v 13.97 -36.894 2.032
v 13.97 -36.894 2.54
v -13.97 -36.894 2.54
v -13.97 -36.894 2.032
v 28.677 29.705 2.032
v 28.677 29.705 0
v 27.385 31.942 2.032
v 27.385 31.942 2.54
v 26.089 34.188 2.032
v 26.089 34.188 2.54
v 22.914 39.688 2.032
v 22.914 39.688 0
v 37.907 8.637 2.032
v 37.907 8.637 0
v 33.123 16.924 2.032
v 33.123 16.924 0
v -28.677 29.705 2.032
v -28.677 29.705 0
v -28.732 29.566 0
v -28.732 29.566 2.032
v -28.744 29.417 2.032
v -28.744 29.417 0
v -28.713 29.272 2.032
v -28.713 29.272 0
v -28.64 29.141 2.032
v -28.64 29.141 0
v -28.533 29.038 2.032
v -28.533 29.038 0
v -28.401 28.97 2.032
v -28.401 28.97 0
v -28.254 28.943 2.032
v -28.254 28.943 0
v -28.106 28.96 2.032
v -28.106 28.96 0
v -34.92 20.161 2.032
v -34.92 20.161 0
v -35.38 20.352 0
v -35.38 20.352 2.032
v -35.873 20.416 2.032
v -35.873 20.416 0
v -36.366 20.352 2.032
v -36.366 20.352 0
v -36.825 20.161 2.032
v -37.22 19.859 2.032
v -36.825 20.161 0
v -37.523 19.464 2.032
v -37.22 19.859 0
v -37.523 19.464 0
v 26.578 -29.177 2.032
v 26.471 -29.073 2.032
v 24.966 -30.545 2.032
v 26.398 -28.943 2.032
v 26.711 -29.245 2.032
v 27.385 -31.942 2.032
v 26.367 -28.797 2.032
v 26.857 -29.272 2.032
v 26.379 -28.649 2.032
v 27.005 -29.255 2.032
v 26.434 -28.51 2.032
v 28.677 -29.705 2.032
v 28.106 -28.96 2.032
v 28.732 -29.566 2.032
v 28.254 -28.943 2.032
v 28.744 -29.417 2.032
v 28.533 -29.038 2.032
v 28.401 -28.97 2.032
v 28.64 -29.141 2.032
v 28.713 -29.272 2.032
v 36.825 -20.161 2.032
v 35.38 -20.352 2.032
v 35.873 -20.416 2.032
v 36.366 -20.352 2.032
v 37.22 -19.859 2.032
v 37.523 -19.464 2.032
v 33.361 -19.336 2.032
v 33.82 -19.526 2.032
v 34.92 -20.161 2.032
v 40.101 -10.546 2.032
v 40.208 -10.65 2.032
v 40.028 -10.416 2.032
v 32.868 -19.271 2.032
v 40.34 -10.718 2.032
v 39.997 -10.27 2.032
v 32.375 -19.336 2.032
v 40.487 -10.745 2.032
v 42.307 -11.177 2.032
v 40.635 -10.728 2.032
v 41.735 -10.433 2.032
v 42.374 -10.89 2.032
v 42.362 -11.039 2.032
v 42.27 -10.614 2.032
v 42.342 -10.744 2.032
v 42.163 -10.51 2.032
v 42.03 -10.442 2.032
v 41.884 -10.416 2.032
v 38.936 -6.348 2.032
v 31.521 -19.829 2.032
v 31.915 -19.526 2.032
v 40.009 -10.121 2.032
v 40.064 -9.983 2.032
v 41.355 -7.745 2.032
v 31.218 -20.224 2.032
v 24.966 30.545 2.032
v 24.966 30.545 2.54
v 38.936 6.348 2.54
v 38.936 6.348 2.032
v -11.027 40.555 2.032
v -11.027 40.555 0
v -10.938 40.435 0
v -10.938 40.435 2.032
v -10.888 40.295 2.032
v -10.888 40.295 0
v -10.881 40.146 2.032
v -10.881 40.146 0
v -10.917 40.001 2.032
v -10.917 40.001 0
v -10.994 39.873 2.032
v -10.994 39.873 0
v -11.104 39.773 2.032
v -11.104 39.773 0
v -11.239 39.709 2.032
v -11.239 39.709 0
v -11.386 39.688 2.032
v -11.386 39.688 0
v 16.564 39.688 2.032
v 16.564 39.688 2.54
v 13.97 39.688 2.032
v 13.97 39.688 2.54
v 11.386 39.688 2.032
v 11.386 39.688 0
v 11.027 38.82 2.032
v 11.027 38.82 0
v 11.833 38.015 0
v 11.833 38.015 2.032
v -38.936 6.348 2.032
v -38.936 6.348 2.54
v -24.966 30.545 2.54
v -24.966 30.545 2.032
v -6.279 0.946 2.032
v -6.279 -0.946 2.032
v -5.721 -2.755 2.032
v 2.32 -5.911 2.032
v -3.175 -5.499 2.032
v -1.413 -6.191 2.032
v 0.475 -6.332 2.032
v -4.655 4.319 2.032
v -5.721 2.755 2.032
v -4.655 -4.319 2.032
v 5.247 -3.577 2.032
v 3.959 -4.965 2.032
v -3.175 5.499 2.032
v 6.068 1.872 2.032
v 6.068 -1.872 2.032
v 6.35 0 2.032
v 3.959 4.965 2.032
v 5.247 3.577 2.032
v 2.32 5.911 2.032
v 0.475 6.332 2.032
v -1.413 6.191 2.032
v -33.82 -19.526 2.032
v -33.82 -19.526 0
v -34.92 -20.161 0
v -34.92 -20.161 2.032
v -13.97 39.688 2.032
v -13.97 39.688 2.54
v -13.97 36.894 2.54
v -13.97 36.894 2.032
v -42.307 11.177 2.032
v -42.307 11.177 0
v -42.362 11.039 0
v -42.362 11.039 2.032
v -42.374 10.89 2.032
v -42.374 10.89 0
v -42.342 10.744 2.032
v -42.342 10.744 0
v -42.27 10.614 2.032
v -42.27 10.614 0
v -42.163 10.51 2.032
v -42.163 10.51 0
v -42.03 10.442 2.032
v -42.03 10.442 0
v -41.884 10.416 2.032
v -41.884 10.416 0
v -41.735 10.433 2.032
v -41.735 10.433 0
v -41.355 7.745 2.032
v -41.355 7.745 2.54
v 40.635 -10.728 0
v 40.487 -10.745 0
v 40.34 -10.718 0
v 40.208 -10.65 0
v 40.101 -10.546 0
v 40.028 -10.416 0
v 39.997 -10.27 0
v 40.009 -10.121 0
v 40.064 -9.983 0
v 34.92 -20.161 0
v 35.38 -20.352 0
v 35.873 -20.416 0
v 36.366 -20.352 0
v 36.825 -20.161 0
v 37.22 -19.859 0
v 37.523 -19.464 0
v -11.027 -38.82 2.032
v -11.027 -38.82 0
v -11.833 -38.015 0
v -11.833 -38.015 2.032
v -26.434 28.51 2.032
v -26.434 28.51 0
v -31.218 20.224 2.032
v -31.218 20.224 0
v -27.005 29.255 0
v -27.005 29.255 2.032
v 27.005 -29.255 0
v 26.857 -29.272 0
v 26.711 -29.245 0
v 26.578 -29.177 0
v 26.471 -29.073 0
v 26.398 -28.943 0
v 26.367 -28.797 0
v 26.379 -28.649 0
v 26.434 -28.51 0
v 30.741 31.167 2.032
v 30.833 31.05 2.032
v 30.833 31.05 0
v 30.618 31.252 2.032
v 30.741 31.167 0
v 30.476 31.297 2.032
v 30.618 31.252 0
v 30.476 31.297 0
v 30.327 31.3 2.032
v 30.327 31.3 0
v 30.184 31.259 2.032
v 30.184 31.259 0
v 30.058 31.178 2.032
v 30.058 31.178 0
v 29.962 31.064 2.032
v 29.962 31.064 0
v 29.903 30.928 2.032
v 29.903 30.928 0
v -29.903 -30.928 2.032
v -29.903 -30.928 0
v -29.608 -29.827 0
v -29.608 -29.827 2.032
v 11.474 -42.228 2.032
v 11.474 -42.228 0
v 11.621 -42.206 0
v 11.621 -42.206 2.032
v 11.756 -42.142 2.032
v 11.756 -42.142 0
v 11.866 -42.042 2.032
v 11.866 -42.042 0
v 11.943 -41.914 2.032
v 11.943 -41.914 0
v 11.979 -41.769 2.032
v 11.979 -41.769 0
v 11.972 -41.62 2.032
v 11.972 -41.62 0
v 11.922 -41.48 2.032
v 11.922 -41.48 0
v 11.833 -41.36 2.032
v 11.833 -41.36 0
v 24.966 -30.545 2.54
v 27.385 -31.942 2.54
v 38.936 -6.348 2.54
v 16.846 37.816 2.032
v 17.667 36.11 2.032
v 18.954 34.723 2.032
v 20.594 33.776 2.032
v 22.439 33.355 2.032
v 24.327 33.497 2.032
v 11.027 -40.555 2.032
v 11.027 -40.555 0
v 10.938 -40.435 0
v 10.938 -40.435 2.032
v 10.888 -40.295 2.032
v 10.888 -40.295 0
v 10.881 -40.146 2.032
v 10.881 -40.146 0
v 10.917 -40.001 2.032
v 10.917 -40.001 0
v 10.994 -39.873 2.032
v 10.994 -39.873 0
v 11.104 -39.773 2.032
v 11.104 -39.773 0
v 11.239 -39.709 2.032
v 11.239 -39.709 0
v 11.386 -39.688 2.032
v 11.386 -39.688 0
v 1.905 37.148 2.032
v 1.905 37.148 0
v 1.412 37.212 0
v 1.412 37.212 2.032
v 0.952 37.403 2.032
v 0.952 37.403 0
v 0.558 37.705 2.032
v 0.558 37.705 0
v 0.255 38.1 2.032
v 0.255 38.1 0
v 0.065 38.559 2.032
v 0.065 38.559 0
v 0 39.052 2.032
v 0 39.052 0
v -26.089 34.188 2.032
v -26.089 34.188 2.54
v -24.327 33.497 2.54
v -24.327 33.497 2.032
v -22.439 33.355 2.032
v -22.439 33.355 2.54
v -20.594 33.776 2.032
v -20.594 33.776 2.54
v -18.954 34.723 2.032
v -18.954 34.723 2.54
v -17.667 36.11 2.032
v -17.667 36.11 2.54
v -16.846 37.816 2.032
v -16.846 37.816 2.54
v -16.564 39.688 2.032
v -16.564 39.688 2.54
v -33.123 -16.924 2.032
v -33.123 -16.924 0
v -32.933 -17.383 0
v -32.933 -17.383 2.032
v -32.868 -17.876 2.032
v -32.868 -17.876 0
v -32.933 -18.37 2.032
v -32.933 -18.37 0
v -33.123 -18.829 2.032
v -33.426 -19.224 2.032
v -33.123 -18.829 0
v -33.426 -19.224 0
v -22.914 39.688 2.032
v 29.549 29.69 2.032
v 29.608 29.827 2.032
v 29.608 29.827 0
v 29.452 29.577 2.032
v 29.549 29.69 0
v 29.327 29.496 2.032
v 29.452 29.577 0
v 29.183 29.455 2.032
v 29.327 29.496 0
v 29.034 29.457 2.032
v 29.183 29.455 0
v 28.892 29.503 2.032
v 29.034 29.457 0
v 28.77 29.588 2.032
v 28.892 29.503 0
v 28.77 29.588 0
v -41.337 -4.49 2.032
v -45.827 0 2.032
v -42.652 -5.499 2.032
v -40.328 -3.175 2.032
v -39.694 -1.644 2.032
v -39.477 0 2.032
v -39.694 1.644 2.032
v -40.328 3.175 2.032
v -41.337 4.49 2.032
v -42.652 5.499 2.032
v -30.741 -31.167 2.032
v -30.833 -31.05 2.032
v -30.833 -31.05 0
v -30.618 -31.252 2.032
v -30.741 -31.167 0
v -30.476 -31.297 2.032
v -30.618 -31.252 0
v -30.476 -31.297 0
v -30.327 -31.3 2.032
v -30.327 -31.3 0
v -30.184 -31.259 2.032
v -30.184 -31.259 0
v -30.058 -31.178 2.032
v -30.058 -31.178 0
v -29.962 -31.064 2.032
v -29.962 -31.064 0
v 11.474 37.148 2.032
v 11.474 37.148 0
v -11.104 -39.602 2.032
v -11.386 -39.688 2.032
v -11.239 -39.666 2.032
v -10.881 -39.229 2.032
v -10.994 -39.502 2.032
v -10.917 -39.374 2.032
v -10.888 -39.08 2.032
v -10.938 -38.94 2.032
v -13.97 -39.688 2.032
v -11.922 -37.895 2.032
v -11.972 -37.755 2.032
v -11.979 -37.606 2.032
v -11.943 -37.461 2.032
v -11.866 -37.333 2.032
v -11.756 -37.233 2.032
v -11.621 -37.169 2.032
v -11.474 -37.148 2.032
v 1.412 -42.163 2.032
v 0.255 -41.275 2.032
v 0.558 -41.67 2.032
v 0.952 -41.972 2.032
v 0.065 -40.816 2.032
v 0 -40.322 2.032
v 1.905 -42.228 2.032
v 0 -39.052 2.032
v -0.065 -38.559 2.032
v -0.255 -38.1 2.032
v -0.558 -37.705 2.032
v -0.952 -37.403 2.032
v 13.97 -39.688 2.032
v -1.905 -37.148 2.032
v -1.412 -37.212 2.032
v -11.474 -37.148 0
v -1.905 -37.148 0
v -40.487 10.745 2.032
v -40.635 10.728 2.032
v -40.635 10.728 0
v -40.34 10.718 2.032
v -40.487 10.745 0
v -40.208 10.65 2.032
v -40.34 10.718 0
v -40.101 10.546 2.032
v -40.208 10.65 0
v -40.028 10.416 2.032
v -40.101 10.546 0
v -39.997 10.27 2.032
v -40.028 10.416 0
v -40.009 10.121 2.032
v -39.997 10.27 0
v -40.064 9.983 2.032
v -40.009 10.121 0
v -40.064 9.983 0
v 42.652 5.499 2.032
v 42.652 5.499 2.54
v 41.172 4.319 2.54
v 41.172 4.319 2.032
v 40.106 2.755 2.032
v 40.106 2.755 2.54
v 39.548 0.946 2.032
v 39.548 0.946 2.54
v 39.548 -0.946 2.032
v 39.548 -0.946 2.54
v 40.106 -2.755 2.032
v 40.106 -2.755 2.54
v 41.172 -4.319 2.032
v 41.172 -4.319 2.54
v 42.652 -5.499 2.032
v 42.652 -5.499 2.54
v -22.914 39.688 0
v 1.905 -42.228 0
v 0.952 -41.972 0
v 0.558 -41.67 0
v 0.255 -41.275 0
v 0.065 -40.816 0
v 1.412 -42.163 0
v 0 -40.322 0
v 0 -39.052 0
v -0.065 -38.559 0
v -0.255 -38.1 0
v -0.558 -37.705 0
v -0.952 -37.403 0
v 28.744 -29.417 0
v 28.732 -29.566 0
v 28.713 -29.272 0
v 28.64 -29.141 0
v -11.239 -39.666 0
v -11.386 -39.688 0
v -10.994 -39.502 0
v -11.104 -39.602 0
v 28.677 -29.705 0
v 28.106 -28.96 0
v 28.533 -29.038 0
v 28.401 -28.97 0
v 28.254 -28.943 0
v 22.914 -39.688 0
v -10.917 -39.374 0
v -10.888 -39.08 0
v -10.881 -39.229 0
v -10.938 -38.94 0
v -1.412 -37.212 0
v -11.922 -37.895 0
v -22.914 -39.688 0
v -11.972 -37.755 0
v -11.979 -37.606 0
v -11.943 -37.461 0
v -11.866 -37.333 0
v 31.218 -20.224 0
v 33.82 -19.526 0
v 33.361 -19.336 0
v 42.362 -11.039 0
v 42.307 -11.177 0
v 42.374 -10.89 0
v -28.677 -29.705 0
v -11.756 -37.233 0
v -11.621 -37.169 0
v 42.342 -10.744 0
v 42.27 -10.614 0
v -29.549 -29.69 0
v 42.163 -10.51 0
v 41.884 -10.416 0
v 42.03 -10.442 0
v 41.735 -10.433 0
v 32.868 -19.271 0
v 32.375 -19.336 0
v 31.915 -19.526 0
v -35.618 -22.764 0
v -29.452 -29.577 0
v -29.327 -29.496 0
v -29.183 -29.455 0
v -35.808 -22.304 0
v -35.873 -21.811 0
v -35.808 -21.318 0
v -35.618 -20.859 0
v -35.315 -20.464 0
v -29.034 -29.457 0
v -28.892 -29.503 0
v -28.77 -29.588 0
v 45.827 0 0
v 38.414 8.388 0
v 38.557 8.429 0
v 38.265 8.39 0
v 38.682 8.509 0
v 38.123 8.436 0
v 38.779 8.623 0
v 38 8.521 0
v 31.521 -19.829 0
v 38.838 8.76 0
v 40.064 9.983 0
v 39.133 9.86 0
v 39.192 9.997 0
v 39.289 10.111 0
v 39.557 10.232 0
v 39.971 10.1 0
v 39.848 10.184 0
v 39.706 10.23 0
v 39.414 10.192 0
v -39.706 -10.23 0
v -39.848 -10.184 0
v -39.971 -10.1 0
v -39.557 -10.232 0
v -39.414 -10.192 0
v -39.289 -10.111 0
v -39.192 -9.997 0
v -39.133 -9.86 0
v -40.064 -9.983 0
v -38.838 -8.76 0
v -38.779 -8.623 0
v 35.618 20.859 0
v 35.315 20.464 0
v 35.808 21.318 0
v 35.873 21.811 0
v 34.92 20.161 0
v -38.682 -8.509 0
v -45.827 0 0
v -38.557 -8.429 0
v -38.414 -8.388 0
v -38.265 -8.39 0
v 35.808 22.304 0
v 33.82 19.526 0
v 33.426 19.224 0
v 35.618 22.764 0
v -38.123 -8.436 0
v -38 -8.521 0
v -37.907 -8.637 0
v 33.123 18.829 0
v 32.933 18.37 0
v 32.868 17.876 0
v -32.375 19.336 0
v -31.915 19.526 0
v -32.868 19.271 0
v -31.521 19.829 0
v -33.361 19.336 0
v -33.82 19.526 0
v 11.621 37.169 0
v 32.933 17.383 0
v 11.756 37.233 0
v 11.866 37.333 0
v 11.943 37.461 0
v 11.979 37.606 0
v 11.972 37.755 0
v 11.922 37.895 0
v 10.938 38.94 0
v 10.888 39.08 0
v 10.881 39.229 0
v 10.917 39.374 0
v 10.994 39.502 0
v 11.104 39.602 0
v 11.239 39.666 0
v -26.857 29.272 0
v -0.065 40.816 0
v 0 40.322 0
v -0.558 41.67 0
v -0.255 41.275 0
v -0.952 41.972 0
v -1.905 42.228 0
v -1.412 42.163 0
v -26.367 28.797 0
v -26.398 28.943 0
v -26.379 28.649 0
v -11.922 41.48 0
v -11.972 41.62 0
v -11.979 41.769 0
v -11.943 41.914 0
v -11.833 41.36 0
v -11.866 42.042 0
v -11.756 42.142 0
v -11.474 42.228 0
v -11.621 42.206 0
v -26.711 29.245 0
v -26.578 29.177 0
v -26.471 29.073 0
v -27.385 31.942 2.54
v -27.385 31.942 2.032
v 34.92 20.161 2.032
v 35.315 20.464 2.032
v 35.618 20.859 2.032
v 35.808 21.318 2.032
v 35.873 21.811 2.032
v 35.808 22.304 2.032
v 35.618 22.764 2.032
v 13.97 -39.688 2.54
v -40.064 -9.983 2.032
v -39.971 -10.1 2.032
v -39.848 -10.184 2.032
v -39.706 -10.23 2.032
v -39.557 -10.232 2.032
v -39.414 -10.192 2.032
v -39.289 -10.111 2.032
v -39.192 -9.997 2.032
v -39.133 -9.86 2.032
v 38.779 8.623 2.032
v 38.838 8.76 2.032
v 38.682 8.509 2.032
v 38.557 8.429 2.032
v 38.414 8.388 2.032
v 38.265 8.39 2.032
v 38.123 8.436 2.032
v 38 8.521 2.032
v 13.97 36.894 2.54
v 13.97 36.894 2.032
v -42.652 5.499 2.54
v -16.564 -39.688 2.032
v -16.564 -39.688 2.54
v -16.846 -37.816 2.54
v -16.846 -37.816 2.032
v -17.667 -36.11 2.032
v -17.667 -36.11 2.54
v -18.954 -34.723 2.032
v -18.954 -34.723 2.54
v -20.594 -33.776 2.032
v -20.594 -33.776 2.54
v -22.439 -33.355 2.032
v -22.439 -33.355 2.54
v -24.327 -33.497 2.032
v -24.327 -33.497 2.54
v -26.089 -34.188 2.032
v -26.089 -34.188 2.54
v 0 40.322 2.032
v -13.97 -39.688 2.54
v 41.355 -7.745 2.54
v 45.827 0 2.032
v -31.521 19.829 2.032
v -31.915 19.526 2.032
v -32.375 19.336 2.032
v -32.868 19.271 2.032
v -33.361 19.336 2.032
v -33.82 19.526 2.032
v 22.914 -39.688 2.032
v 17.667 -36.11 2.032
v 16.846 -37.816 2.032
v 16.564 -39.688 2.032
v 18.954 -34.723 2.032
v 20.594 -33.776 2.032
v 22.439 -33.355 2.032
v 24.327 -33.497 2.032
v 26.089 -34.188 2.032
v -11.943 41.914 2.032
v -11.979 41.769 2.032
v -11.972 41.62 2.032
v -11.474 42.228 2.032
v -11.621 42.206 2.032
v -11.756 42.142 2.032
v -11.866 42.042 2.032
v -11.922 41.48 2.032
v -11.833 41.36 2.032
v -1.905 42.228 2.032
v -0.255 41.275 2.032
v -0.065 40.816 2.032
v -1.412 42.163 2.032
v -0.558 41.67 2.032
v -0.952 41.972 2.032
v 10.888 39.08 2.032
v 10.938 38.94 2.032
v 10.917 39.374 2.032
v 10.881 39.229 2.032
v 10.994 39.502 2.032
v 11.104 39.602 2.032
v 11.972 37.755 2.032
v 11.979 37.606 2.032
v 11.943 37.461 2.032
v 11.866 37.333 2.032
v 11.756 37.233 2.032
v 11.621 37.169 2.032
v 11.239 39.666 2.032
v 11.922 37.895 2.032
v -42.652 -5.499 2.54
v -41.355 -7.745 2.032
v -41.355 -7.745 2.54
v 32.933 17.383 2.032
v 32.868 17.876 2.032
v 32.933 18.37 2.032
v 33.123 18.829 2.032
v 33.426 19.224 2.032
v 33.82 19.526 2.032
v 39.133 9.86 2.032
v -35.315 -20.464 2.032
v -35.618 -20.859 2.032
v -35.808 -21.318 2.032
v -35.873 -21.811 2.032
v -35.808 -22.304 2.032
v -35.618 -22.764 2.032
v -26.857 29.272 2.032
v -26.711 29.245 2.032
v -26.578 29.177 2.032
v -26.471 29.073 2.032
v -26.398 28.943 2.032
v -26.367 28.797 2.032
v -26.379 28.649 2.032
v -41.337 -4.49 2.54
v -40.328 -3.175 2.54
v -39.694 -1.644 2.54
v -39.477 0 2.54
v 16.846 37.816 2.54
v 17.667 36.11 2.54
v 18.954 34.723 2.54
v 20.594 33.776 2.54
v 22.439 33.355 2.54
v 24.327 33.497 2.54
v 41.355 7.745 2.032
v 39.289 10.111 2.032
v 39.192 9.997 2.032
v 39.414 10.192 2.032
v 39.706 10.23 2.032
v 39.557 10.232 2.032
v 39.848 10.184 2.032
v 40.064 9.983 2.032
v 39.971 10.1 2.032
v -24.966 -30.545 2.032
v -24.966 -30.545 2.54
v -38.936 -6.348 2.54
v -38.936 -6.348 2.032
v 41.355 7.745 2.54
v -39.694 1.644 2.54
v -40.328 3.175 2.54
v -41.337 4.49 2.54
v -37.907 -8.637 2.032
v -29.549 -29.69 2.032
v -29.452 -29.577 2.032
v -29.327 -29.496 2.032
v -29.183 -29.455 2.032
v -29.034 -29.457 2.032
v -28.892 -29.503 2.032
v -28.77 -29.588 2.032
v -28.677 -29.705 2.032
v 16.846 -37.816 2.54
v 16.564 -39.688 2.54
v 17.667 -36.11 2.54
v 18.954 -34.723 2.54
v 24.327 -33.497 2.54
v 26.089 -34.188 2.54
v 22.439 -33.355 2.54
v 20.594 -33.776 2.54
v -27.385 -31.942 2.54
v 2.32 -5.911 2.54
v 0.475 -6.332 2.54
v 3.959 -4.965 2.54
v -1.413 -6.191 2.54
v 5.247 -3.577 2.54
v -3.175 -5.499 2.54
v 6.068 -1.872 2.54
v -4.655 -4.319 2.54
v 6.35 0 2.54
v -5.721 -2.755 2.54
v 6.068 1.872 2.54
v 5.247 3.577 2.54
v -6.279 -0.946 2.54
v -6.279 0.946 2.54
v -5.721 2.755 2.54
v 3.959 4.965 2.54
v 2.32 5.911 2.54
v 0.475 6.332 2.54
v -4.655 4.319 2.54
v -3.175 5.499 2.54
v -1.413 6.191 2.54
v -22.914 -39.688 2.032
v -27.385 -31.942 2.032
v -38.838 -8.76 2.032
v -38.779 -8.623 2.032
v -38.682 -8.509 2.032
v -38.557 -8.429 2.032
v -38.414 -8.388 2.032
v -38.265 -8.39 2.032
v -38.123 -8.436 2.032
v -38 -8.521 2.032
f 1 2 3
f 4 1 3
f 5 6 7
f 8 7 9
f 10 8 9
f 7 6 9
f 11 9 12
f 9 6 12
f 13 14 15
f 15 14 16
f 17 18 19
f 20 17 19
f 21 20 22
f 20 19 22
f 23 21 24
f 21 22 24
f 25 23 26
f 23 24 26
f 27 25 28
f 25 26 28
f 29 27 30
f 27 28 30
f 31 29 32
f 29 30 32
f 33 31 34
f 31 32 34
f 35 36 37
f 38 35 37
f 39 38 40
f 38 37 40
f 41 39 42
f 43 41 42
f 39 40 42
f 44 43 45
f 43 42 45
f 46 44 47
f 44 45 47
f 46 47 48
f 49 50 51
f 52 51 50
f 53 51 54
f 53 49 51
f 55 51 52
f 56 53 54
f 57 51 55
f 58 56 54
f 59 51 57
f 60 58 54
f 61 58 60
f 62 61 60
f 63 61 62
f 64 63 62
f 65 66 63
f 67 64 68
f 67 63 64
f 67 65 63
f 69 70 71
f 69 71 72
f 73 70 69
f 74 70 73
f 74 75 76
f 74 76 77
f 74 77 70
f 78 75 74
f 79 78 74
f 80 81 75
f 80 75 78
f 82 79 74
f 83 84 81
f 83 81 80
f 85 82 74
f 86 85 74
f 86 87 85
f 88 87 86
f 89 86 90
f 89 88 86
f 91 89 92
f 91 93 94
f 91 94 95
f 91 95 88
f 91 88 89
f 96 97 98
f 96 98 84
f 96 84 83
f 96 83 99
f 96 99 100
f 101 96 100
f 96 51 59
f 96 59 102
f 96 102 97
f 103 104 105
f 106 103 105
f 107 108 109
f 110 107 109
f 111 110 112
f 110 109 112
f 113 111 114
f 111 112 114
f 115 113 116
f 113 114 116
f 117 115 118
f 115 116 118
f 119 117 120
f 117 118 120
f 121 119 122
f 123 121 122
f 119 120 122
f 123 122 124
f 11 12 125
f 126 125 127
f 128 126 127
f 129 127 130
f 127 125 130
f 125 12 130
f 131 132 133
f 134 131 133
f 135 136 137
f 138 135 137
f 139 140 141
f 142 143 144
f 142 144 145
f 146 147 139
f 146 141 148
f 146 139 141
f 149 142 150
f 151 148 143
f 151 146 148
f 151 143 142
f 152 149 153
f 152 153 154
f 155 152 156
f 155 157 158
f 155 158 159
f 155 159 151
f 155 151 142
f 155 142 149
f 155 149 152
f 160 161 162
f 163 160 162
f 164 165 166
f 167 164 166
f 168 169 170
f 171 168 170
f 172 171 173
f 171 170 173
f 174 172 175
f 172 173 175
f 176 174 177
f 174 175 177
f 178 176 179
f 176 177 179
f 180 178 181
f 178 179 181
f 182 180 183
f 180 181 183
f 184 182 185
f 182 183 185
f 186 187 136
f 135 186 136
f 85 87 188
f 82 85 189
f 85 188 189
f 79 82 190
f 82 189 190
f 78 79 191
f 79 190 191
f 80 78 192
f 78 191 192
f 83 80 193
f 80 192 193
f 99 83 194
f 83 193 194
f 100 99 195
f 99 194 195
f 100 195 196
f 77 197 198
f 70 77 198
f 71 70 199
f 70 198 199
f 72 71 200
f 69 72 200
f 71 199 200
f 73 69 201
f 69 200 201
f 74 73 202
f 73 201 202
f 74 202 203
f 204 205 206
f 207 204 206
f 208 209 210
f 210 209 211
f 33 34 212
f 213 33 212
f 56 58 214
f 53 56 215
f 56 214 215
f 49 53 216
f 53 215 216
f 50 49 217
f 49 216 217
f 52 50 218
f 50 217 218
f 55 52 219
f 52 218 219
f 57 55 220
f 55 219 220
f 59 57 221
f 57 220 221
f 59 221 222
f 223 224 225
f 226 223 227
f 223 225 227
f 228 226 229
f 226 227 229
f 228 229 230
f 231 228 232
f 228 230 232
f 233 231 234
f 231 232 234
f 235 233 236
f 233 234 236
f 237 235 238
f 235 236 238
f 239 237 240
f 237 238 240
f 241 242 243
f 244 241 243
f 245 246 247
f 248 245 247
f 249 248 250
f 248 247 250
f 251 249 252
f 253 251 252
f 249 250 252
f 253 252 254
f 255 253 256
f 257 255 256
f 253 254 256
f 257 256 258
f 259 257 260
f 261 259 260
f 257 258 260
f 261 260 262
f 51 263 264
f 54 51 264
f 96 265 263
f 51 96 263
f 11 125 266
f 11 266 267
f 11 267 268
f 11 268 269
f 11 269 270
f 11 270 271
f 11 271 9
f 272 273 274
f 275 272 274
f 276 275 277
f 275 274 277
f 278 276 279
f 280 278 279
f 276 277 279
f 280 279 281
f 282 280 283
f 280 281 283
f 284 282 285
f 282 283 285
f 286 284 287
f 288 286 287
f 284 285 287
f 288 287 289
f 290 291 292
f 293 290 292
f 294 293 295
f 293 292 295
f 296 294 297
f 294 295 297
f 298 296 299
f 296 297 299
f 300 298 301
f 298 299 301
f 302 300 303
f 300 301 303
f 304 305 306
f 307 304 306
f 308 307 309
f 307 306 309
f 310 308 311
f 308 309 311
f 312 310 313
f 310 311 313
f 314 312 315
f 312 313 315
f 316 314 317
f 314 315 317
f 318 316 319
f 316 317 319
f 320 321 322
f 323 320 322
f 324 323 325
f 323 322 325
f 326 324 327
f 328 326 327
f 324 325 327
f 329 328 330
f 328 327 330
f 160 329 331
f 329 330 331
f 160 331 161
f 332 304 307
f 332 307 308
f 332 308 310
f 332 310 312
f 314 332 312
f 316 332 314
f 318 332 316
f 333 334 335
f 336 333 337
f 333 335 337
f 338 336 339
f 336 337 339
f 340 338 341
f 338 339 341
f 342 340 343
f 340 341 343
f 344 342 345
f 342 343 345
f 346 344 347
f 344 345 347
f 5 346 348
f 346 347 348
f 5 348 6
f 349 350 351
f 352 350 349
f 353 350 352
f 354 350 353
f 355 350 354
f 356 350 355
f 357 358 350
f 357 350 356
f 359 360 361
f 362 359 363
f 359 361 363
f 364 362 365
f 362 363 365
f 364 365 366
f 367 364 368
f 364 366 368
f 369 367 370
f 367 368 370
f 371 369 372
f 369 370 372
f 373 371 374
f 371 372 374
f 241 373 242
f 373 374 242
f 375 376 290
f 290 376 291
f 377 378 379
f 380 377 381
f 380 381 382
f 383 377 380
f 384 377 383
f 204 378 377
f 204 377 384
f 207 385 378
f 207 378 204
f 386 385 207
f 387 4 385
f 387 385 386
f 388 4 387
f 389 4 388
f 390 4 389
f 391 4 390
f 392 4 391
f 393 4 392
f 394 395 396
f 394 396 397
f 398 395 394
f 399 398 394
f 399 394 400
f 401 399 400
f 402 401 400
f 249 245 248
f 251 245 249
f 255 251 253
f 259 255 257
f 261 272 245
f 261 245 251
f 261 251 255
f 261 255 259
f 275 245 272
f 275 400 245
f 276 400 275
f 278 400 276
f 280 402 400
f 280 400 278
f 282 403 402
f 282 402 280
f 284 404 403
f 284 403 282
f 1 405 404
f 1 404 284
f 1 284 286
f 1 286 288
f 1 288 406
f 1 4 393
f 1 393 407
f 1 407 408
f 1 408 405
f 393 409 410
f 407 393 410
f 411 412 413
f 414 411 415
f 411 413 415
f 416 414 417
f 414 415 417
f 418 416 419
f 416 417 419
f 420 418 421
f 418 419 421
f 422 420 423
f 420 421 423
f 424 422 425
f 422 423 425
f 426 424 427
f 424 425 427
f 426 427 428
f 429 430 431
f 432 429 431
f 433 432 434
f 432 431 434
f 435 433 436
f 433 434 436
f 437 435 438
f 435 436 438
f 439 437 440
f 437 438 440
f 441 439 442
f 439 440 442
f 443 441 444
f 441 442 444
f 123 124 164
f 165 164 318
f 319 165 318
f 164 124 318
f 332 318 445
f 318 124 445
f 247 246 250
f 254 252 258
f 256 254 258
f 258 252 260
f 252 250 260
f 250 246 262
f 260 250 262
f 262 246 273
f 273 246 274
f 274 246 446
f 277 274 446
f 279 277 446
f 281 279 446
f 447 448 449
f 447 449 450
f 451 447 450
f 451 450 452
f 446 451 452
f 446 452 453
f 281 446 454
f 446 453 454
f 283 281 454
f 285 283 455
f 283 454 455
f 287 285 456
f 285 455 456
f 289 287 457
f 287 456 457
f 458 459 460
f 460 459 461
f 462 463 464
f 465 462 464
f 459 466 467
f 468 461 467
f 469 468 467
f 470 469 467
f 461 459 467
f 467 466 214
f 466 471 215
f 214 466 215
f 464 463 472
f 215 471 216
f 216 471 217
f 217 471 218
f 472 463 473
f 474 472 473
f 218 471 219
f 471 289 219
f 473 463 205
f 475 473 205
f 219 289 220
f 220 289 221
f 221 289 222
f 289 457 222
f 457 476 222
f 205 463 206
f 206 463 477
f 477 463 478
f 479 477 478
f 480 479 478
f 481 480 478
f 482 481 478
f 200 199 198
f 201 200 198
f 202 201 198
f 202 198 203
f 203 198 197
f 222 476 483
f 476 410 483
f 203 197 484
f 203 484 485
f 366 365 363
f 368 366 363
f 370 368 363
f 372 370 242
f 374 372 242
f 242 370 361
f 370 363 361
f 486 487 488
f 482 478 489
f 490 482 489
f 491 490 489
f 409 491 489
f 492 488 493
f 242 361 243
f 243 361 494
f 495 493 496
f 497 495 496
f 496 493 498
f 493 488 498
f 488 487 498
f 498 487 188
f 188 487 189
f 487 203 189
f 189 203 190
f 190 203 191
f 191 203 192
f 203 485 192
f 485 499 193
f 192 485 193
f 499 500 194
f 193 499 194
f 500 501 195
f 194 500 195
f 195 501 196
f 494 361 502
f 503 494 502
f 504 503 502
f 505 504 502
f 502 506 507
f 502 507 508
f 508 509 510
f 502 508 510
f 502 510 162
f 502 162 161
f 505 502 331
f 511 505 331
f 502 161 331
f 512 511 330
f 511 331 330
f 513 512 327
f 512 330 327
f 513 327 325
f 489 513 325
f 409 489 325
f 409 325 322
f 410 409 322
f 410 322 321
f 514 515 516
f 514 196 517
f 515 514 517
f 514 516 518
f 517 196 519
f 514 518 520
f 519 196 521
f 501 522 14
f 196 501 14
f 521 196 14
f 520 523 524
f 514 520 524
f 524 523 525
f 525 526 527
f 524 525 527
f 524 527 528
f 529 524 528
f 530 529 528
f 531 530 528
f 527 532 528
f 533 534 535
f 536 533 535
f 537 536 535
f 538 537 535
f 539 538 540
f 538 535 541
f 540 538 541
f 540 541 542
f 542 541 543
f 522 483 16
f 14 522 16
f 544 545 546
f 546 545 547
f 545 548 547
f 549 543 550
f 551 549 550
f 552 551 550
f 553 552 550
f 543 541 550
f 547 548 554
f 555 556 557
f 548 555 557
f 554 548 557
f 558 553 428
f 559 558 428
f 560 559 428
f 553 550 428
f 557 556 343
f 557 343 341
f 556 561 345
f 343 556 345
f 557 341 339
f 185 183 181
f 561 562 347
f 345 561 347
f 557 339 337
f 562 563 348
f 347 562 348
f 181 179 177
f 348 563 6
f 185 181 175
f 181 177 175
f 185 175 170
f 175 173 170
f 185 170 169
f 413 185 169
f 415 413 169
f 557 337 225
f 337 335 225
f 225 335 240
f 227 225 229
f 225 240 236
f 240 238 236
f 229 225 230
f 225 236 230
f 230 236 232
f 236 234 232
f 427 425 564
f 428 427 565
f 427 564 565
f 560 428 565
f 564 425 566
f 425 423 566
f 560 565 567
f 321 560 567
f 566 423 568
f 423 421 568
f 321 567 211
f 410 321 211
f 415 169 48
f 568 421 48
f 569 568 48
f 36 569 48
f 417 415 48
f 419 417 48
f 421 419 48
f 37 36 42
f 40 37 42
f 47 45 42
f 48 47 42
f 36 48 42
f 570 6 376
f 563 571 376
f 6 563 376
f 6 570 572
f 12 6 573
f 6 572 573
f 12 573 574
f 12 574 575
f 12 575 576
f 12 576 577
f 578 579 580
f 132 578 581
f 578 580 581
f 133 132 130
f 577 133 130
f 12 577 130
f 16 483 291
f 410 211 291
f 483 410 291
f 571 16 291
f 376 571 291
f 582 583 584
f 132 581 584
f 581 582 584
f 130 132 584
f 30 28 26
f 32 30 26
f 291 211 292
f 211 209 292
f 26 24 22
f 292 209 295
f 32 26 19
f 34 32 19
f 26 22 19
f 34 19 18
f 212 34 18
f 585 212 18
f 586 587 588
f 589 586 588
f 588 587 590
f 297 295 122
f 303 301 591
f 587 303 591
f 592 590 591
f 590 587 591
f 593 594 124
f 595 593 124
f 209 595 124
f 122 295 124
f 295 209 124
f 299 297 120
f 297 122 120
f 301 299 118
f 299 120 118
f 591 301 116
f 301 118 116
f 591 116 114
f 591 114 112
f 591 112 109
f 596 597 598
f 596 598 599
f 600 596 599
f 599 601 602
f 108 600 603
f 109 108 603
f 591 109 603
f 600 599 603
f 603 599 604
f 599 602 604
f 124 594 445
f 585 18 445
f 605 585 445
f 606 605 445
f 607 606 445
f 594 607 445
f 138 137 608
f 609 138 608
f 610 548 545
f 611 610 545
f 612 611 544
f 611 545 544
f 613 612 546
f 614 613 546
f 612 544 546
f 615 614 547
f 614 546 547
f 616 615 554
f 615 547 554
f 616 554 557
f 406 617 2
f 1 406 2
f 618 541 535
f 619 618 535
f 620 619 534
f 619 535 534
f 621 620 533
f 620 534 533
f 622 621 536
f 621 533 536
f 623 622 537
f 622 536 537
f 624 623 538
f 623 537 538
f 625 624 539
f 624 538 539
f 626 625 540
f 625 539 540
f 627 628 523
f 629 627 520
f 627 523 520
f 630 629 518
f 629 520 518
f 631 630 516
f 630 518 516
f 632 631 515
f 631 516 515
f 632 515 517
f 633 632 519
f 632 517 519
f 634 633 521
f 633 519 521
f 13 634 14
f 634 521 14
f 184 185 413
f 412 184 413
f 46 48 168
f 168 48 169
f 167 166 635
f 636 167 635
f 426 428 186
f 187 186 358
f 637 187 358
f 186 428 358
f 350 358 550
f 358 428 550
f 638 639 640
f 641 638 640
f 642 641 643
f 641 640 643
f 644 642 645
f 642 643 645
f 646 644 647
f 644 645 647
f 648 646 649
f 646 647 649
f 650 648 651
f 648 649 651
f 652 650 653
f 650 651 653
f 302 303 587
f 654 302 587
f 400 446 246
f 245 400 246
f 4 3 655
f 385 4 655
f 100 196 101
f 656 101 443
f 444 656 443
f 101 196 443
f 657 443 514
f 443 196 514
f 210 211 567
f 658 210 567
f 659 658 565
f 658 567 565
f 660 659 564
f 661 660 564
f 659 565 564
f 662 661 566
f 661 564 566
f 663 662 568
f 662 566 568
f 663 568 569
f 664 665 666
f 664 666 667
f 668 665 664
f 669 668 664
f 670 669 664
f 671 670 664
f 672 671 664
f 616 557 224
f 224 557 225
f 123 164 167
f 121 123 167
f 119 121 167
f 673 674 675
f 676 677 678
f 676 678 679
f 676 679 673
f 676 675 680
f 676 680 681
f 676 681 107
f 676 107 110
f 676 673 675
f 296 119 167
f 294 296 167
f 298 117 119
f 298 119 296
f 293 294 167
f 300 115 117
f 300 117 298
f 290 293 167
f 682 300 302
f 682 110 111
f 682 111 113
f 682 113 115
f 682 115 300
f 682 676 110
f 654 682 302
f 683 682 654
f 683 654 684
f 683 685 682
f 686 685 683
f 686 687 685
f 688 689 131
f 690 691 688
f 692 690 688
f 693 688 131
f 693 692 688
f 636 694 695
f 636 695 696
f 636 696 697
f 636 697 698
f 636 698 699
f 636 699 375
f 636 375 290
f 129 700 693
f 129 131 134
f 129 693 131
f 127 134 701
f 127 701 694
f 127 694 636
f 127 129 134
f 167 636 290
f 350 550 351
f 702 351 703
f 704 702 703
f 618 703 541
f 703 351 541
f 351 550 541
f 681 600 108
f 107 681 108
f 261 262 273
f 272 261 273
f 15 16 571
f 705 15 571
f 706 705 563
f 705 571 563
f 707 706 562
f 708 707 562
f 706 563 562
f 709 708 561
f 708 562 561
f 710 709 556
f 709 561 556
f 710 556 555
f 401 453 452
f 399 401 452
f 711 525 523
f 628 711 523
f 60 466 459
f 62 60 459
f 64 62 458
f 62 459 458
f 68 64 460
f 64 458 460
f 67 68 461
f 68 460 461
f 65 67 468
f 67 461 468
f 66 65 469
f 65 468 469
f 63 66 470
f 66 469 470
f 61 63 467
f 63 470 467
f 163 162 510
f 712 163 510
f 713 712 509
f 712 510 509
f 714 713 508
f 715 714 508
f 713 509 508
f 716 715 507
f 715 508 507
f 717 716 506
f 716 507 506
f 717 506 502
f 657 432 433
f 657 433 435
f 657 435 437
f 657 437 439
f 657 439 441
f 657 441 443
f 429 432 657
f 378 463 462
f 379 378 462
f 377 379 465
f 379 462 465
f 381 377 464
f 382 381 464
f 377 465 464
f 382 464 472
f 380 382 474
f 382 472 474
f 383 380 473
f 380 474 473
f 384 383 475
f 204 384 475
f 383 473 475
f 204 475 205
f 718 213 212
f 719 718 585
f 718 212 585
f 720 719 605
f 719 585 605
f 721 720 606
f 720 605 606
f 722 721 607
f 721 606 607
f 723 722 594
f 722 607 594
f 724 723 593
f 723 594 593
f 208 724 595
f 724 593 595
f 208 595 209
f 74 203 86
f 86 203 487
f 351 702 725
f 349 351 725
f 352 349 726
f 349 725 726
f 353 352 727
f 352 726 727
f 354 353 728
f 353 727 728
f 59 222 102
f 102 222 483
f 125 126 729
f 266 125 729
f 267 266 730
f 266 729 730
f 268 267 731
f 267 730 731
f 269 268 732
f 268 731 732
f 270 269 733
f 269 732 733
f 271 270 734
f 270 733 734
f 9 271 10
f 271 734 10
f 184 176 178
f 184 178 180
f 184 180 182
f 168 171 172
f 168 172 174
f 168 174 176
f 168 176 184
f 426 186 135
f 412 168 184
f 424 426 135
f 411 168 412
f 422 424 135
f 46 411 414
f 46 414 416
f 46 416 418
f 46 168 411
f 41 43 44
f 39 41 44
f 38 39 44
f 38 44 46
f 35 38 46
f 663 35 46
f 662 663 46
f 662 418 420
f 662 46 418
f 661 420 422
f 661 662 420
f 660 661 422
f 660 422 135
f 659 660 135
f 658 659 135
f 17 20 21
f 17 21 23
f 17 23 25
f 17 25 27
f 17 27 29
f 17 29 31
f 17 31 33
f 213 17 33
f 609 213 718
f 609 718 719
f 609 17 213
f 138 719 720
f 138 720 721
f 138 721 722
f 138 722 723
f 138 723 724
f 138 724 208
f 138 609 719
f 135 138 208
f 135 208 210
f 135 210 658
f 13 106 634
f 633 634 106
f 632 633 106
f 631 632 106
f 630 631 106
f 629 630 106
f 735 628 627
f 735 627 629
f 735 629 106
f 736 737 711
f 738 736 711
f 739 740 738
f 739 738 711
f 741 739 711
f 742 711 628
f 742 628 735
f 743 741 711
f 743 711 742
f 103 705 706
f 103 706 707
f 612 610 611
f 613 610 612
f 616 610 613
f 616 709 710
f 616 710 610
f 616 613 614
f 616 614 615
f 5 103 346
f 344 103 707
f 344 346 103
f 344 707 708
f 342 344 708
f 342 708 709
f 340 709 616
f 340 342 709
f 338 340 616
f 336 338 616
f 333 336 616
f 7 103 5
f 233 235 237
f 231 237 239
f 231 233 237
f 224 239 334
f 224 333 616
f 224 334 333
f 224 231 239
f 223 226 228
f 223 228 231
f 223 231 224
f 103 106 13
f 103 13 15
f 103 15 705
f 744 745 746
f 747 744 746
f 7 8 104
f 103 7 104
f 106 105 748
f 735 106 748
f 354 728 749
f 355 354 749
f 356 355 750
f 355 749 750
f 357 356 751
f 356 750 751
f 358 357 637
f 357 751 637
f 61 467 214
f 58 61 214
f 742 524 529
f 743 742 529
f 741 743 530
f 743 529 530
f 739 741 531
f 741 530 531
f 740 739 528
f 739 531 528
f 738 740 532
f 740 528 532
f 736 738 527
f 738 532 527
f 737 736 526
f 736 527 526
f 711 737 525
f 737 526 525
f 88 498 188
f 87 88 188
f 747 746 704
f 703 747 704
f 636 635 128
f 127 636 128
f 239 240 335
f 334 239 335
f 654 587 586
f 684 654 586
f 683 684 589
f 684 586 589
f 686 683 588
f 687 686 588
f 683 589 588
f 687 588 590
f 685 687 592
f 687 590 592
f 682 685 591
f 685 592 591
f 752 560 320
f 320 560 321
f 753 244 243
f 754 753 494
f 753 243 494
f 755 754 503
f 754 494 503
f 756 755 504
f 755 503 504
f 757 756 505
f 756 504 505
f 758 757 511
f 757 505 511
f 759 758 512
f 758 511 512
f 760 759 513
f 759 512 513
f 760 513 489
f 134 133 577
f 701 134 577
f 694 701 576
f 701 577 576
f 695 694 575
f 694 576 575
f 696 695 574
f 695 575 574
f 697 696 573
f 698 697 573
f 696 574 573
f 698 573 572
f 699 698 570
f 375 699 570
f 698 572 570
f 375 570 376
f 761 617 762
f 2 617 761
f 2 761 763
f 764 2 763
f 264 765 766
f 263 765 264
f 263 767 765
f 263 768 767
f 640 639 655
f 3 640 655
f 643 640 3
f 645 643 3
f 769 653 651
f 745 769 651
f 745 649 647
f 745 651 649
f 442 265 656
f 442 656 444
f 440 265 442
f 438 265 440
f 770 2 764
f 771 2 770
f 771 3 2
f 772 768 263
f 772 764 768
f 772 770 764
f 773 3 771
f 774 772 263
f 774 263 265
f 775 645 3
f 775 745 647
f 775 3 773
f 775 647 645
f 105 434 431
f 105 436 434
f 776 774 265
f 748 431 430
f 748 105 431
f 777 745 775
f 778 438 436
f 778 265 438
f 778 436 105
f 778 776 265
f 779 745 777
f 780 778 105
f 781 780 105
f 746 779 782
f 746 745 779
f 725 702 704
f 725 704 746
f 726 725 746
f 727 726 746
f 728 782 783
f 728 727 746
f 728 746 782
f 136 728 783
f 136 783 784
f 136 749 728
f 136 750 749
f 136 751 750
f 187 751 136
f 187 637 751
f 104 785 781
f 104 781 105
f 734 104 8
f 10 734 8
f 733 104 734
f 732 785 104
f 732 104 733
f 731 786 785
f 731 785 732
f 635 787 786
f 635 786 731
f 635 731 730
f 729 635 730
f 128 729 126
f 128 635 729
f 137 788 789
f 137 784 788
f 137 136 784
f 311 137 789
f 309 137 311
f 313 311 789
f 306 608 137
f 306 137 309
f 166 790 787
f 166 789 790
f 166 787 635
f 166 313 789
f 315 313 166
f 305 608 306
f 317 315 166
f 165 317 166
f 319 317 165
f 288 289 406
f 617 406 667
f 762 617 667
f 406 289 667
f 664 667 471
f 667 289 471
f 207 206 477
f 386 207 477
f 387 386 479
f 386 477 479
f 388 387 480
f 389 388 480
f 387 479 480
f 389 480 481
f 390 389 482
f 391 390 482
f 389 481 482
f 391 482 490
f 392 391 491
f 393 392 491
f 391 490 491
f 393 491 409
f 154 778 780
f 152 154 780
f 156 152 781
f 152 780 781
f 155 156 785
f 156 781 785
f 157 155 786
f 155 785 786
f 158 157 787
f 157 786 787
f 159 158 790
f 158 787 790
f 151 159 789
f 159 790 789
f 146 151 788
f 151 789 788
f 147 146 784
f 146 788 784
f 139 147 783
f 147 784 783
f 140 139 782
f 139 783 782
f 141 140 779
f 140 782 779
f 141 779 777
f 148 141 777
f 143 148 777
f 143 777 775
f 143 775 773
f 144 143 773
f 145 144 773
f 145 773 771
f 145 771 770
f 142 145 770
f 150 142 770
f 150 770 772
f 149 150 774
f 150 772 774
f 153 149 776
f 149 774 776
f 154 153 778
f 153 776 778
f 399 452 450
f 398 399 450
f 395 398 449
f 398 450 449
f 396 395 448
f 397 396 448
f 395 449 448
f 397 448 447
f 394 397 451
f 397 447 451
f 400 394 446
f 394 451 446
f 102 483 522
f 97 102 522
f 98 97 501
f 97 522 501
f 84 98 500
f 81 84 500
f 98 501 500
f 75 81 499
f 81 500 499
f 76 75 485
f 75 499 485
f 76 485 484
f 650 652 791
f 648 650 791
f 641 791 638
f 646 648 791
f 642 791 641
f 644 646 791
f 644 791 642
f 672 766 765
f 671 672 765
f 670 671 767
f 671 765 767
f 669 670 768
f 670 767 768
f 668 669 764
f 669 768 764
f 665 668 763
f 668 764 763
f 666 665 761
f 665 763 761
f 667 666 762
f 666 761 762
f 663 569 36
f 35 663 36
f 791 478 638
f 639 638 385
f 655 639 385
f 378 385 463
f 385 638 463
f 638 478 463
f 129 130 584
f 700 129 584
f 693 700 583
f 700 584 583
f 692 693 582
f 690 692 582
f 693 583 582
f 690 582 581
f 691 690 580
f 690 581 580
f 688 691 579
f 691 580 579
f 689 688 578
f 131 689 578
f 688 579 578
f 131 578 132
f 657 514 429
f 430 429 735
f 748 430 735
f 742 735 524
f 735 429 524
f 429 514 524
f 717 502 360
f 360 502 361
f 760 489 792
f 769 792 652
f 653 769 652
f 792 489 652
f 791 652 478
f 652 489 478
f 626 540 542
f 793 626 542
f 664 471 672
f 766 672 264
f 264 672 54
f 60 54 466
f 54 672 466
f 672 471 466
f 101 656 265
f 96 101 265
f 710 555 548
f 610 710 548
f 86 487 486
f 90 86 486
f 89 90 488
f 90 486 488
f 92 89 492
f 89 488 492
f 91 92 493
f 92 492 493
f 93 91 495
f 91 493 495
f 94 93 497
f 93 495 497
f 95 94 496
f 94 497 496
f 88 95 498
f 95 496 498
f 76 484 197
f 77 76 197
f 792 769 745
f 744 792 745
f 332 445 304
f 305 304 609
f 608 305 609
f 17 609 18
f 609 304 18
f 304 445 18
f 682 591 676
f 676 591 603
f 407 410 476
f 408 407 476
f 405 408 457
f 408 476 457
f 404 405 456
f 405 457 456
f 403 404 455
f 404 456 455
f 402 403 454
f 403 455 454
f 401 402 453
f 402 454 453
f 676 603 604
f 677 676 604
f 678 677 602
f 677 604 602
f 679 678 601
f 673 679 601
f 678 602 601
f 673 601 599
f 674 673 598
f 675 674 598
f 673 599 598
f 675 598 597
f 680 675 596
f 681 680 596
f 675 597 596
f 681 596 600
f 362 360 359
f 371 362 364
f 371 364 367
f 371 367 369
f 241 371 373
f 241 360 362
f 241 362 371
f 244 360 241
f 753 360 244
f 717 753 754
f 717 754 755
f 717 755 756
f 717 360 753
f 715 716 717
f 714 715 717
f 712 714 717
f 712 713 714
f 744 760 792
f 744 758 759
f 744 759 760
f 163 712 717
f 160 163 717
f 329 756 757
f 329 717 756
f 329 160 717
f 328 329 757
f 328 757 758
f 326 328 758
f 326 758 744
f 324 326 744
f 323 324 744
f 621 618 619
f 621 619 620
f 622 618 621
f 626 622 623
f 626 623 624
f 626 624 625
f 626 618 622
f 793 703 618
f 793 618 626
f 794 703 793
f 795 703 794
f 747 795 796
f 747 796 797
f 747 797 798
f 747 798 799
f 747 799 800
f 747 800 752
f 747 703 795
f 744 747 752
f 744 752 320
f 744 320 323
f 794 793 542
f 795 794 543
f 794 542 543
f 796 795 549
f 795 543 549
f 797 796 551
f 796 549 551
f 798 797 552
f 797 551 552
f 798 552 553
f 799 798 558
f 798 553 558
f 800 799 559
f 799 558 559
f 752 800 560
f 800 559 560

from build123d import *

# Parameters (mm, degrees)
F1_DEPTH = 2.54
F2_COUNT = 6
F4_R     = 6.35
F5_DEPTH = 0.508


# Not quite as in the source:
# - a feature names something its author has since deleted; it is built from what else it names


with BuildPart() as f1:
    # F0 (on Top) → F1 (new body)
    with BuildSketch(Plane.XY):
        with BuildLine():
            Line((11.3864204897, -39.6875), (22.9135888085, -39.6875))
            Line((22.9135888085, -39.6875), (0, 0))
            Line((0, 0), (-22.9135888085, -39.6875))
            Line((-22.9135888085, -39.6875), (-11.3864204897, -39.6875))
            ThreePointArc((-11.3864204897, -39.6875), (-10.9170896872, -39.3739031836), (-11.0272102448, -38.8202897552))
            Line((-11.0272102448, -38.8202897552), (-11.8327897552, -38.0147102448))
            ThreePointArc((-11.8327897552, -38.0147102448), (-11.9429103128, -37.4610968164), (-11.4735795103, -37.1475))
            Line((-11.4735795103, -37.1475), (-1.905, -37.1475))
            ThreePointArc((-1.905, -37.1475), (-0.5579615818, -37.7054615818), (0, -39.0525))
            Line((0, -39.0525), (0, -39.6875))
            Line((0, -39.6875), (11.3864204897, -39.6875))
        make_face()
        with BuildLine():
            ThreePointArc((11.0272102448, -40.5547102448), (10.9170896872, -40.0010968164), (11.3864204897, -39.6875))
            Line((11.3864204897, -39.6875), (0, -39.6875))
            Line((0, -39.6875), (0, -40.3225))
            ThreePointArc((0, -40.3225), (0.5579615818, -41.6695384182), (1.905, -42.2275))
            Line((1.905, -42.2275), (11.4735795103, -42.2275))
            ThreePointArc((11.4735795103, -42.2275), (11.9429103128, -41.9139031836), (11.8327897552, -41.3602897552))
            Line((11.8327897552, -41.3602897552), (11.0272102448, -40.5547102448))
        make_face()
    extrude(amount=F1_DEPTH)


with BuildPart() as f2_1:
    # F2: instance of F1
    add(f1.part.rotate(Axis((0, 0, 1.27), (0, 0, -1)), 1 * 360 / F2_COUNT))


with BuildPart() as f2_2:
    # F2: instance of F1
    add(f1.part.rotate(Axis((0, 0, 1.27), (0, 0, -1)), 2 * 360 / F2_COUNT))


with BuildPart() as f2_3:
    # F2: instance of F1
    add(f1.part.rotate(Axis((0, 0, 1.27), (0, 0, -1)), 3 * 360 / F2_COUNT))


with BuildPart() as f2_4:
    # F2: instance of F1
    add(f1.part.rotate(Axis((0, 0, 1.27), (0, 0, -1)), 4 * 360 / F2_COUNT))


with BuildPart() as f2_5:
    # F2: instance of F1
    add(f1.part.rotate(Axis((0, 0, 1.27), (0, 0, -1)), 5 * 360 / F2_COUNT))


with BuildPart() as f1_1:
    add(f1.part)

    # F3: union F2_1, F2_2, F2_3, F2_4, F2_5
    add(f2_1.part)
    add(f2_2.part)
    add(f2_3.part)
    add(f2_4.part)
    add(f2_5.part)

    # F4 (on face) → F5 (cut)
    with BuildSketch(Plane.XY.offset(2.54)):
        with BuildLine():
            Line((13.97, -36.8935), (-13.97, -36.8935))
            Line((-13.97, -36.8935), (-13.97, -39.6875))
            Line((-13.97, -39.6875), (-11.3864204897, -39.6875))
            ThreePointArc((-11.3864204897, -39.6875), (-10.9170896872, -39.3739031836), (-11.0272102448, -38.8202897552))
            Line((-11.0272102448, -38.8202897552), (-11.8327897552, -38.0147102448))
            ThreePointArc((-11.8327897552, -38.0147102448), (-11.9429103128, -37.4610968164), (-11.4735795103, -37.1475))
            Line((-11.4735795103, -37.1475), (-1.905, -37.1475))
            ThreePointArc((-1.905, -37.1475), (-0.5579615818, -37.7054615818), (0, -39.0525))
            Line((0, -39.0525), (0, -40.3225))
            ThreePointArc((0, -40.3225), (0.5579615818, -41.6695384182), (1.905, -42.2275))
            Line((1.905, -42.2275), (11.4735795103, -42.2275))
            ThreePointArc((11.4735795103, -42.2275), (11.9429103128, -41.9139031836), (11.8327897552, -41.3602897552))
            Line((11.8327897552, -41.3602897552), (11.0272102448, -40.5547102448))
            ThreePointArc((11.0272102448, -40.5547102448), (10.9170896872, -40.0010968164), (11.3864204897, -39.6875))
            Line((11.3864204897, -39.6875), (13.97, -39.6875))
            Line((13.97, -39.6875), (13.97, -36.8935))
        make_face()
        with BuildLine():
            Line((-22.9135888085, -39.6875), (-16.5635888085, -39.6875))
            ThreePointArc((-16.5635888085, -39.6875), (-19.7385888085, -34.188238686), (-26.0885888085, -34.188238686))
            Line((-26.0885888085, -34.188238686), (-22.9135888085, -39.6875))
        make_face()
        with BuildLine():
            ThreePointArc((26.0885888085, -34.188238686), (19.7385888085, -34.188238686), (16.5635888085, -39.6875))
            Line((16.5635888085, -39.6875), (22.9135888085, -39.6875))
            Line((22.9135888085, -39.6875), (26.0885888085, -34.188238686))
        make_face()
        with BuildLine():
            Line((-28.6771729679, -29.7046794022), (-27.3853832127, -31.9421248909))
            Line((-27.3853832127, -31.9421248909), (-24.9657082345, -30.5451248909))
            Line((-24.9657082345, -30.5451248909), (-38.9357082345, -6.3483751091))
            Line((-38.9357082345, -6.3483751091), (-41.3553832127, -7.7453751091))
            Line((-41.3553832127, -7.7453751091), (-40.0635934575, -9.9828205978))
            ThreePointArc((-40.0635934575, -9.9828205978), (-39.5573452468, -10.2324745873), (-39.1329622327, -9.8603006727))
            Line((-39.1329622327, -9.8603006727), (-38.8380996671, -8.7598585968))
            ThreePointArc((-38.8380996671, -8.7598585968), (-38.413716653, -8.3876846821), (-37.9074684422, -8.6373386717))
            Line((-37.9074684422, -8.6373386717), (-33.1231786871, -16.9239716058))
            ThreePointArc((-33.1231786871, -16.9239716058), (-32.9328683822, -18.3695218867), (-33.8204570813, -19.52625))
            Line((-33.8204570813, -19.52625), (-34.9203093441, -20.16125))
            ThreePointArc((-34.9203093441, -20.16125), (-35.8078980432, -21.3179781133), (-35.6175877383, -22.7635283942))
            Line((-35.6175877383, -22.7635283942), (-30.8332979832, -31.0501613283))
            ThreePointArc((-30.8332979832, -31.0501613283), (-30.3270497724, -31.2998153179), (-29.9026667583, -30.9276414032))
            Line((-29.9026667583, -30.9276414032), (-29.6078041927, -29.8271993273))
            ThreePointArc((-29.6078041927, -29.8271993273), (-29.1834211786, -29.4550254127), (-28.6771729679, -29.7046794022))
        make_face()
        with BuildLine():
            Line((24.9657082345, -30.5451248909), (27.3853832127, -31.9421248909))
            Line((27.3853832127, -31.9421248909), (28.6771729679, -29.7046794022))
            ThreePointArc((28.6771729679, -29.7046794022), (28.6402555596, -29.1414285963), (28.1057519878, -28.9599890825))
            Line((28.1057519878, -28.9599890825), (27.005309912, -29.254851648))
            ThreePointArc((27.005309912, -29.254851648), (26.4708063402, -29.0734121342), (26.4338889319, -28.5101613283))
            Line((26.4338889319, -28.5101613283), (31.2181786871, -20.2235283942))
            ThreePointArc((31.2181786871, -20.2235283942), (32.3749068004, -19.3359396951), (33.8204570813, -19.52625))
            Line((33.8204570813, -19.52625), (34.9203093441, -20.16125))
            ThreePointArc((34.9203093441, -20.16125), (36.365859625, -20.3515603049), (37.5225877383, -19.4639716058))
            Line((37.5225877383, -19.4639716058), (42.3068774935, -11.1773386717))
            ThreePointArc((42.3068774935, -11.1773386717), (42.2699600852, -10.6140878658), (41.7354565134, -10.432648352))
            Line((41.7354565134, -10.432648352), (40.6350144376, -10.7275109175))
            ThreePointArc((40.6350144376, -10.7275109175), (40.1005108658, -10.5460714037), (40.0635934575, -9.9828205978))
            Line((40.0635934575, -9.9828205978), (41.3553832127, -7.7453751091))
            Line((41.3553832127, -7.7453751091), (38.9357082345, -6.3483751091))
            Line((38.9357082345, -6.3483751091), (24.9657082345, -30.5451248909))
        make_face()
        with BuildLine():
            Line((-45.8271776169, 0), (-42.6521776169, -5.499261314))
            ThreePointArc((-42.6521776169, -5.499261314), (-40.3279163029, -3.175), (-39.4771776169, 0))
            ThreePointArc((-39.4771776169, 0), (-40.3279163029, 3.175), (-42.6521776169, 5.499261314))
            Line((-42.6521776169, 5.499261314), (-45.8271776169, 0))
        make_face()
        with BuildLine():
            ThreePointArc((42.6521776169, 5.499261314), (39.4771776169, 0), (42.6521776169, -5.499261314))
            Line((42.6521776169, -5.499261314), (45.8271776169, 0))
            Line((45.8271776169, 0), (42.6521776169, 5.499261314))
        make_face()
        with BuildLine():
            Line((-40.0635934575, 9.9828205978), (-41.3553832127, 7.7453751091))
            Line((-41.3553832127, 7.7453751091), (-38.9357082345, 6.3483751091))
            Line((-38.9357082345, 6.3483751091), (-24.9657082345, 30.5451248909))
            Line((-24.9657082345, 30.5451248909), (-27.3853832127, 31.9421248909))
            Line((-27.3853832127, 31.9421248909), (-28.6771729679, 29.7046794022))
            ThreePointArc((-28.6771729679, 29.7046794022), (-28.6402555596, 29.1414285963), (-28.1057519878, 28.9599890825))
            Line((-28.1057519878, 28.9599890825), (-27.005309912, 29.254851648))
            ThreePointArc((-27.005309912, 29.254851648), (-26.4708063402, 29.0734121342), (-26.4338889319, 28.5101613283))
            Line((-26.4338889319, 28.5101613283), (-31.2181786871, 20.2235283942))
            ThreePointArc((-31.2181786871, 20.2235283942), (-32.3749068004, 19.3359396951), (-33.8204570813, 19.52625))
            Line((-33.8204570813, 19.52625), (-34.9203093441, 20.16125))
            ThreePointArc((-34.9203093441, 20.16125), (-36.365859625, 20.3515603049), (-37.5225877383, 19.4639716058))
            Line((-37.5225877383, 19.4639716058), (-42.3068774935, 11.1773386717))
            ThreePointArc((-42.3068774935, 11.1773386717), (-42.2699600852, 10.6140878658), (-41.7354565134, 10.432648352))
            Line((-41.7354565134, 10.432648352), (-40.6350144376, 10.7275109175))
            ThreePointArc((-40.6350144376, 10.7275109175), (-40.1005108658, 10.5460714037), (-40.0635934575, 9.9828205978))
        make_face()
        with BuildLine():
            Line((38.9357082345, 6.3483751091), (41.3553832127, 7.7453751091))
            Line((41.3553832127, 7.7453751091), (40.0635934575, 9.9828205978))
            ThreePointArc((40.0635934575, 9.9828205978), (39.5573452468, 10.2324745873), (39.1329622327, 9.8603006727))
            Line((39.1329622327, 9.8603006727), (38.8380996671, 8.7598585968))
            ThreePointArc((38.8380996671, 8.7598585968), (38.413716653, 8.3876846821), (37.9074684422, 8.6373386717))
            Line((37.9074684422, 8.6373386717), (33.1231786871, 16.9239716058))
            ThreePointArc((33.1231786871, 16.9239716058), (32.9328683822, 18.3695218867), (33.8204570813, 19.52625))
            Line((33.8204570813, 19.52625), (34.9203093441, 20.16125))
            ThreePointArc((34.9203093441, 20.16125), (35.8078980432, 21.3179781133), (35.6175877383, 22.7635283942))
            Line((35.6175877383, 22.7635283942), (30.8332979832, 31.0501613283))
            ThreePointArc((30.8332979832, 31.0501613283), (30.3270497724, 31.2998153179), (29.9026667583, 30.9276414032))
            Line((29.9026667583, 30.9276414032), (29.6078041927, 29.8271993273))
            ThreePointArc((29.6078041927, 29.8271993273), (29.1834211786, 29.4550254127), (28.6771729679, 29.7046794022))
            Line((28.6771729679, 29.7046794022), (27.3853832127, 31.9421248909))
            Line((27.3853832127, 31.9421248909), (24.9657082345, 30.5451248909))
            Line((24.9657082345, 30.5451248909), (38.9357082345, 6.3483751091))
        make_face()
        with BuildLine():
            Line((-22.9135888085, 39.6875), (-26.0885888085, 34.188238686))
            ThreePointArc((-26.0885888085, 34.188238686), (-19.7385888085, 34.188238686), (-16.5635888085, 39.6875))
            Line((-16.5635888085, 39.6875), (-22.9135888085, 39.6875))
        make_face()
        with BuildLine():
            ThreePointArc((16.5635888085, 39.6875), (19.7385888085, 34.188238686), (26.0885888085, 34.188238686))
            Line((26.0885888085, 34.188238686), (22.9135888085, 39.6875))
            Line((22.9135888085, 39.6875), (16.5635888085, 39.6875))
        make_face()
        with BuildLine():
            Line((-11.3864204897, 39.6875), (-13.97, 39.6875))
            Line((-13.97, 39.6875), (-13.97, 36.8935))
            Line((-13.97, 36.8935), (13.97, 36.8935))
            Line((13.97, 36.8935), (13.97, 39.6875))
            Line((13.97, 39.6875), (11.3864204897, 39.6875))
            ThreePointArc((11.3864204897, 39.6875), (10.9170896872, 39.3739031836), (11.0272102448, 38.8202897552))
            Line((11.0272102448, 38.8202897552), (11.8327897552, 38.0147102448))
            ThreePointArc((11.8327897552, 38.0147102448), (11.9429103128, 37.4610968164), (11.4735795103, 37.1475))
            Line((11.4735795103, 37.1475), (1.905, 37.1475))
            ThreePointArc((1.905, 37.1475), (0.5579615818, 37.7054615818), (0, 39.0525))
            Line((0, 39.0525), (0, 40.3225))
            ThreePointArc((0, 40.3225), (-0.5579615818, 41.6695384182), (-1.905, 42.2275))
            Line((-1.905, 42.2275), (-11.4735795103, 42.2275))
            ThreePointArc((-11.4735795103, 42.2275), (-11.9429103128, 41.9139031836), (-11.8327897552, 41.3602897552))
            Line((-11.8327897552, 41.3602897552), (-11.0272102448, 40.5547102448))
            ThreePointArc((-11.0272102448, 40.5547102448), (-10.9170896872, 40.0010968164), (-11.3864204897, 39.6875))
        make_face()
        Circle(F4_R)
    extrude(amount=-F5_DEPTH, mode=Mode.SUBTRACT)


solid = f1_1.part
